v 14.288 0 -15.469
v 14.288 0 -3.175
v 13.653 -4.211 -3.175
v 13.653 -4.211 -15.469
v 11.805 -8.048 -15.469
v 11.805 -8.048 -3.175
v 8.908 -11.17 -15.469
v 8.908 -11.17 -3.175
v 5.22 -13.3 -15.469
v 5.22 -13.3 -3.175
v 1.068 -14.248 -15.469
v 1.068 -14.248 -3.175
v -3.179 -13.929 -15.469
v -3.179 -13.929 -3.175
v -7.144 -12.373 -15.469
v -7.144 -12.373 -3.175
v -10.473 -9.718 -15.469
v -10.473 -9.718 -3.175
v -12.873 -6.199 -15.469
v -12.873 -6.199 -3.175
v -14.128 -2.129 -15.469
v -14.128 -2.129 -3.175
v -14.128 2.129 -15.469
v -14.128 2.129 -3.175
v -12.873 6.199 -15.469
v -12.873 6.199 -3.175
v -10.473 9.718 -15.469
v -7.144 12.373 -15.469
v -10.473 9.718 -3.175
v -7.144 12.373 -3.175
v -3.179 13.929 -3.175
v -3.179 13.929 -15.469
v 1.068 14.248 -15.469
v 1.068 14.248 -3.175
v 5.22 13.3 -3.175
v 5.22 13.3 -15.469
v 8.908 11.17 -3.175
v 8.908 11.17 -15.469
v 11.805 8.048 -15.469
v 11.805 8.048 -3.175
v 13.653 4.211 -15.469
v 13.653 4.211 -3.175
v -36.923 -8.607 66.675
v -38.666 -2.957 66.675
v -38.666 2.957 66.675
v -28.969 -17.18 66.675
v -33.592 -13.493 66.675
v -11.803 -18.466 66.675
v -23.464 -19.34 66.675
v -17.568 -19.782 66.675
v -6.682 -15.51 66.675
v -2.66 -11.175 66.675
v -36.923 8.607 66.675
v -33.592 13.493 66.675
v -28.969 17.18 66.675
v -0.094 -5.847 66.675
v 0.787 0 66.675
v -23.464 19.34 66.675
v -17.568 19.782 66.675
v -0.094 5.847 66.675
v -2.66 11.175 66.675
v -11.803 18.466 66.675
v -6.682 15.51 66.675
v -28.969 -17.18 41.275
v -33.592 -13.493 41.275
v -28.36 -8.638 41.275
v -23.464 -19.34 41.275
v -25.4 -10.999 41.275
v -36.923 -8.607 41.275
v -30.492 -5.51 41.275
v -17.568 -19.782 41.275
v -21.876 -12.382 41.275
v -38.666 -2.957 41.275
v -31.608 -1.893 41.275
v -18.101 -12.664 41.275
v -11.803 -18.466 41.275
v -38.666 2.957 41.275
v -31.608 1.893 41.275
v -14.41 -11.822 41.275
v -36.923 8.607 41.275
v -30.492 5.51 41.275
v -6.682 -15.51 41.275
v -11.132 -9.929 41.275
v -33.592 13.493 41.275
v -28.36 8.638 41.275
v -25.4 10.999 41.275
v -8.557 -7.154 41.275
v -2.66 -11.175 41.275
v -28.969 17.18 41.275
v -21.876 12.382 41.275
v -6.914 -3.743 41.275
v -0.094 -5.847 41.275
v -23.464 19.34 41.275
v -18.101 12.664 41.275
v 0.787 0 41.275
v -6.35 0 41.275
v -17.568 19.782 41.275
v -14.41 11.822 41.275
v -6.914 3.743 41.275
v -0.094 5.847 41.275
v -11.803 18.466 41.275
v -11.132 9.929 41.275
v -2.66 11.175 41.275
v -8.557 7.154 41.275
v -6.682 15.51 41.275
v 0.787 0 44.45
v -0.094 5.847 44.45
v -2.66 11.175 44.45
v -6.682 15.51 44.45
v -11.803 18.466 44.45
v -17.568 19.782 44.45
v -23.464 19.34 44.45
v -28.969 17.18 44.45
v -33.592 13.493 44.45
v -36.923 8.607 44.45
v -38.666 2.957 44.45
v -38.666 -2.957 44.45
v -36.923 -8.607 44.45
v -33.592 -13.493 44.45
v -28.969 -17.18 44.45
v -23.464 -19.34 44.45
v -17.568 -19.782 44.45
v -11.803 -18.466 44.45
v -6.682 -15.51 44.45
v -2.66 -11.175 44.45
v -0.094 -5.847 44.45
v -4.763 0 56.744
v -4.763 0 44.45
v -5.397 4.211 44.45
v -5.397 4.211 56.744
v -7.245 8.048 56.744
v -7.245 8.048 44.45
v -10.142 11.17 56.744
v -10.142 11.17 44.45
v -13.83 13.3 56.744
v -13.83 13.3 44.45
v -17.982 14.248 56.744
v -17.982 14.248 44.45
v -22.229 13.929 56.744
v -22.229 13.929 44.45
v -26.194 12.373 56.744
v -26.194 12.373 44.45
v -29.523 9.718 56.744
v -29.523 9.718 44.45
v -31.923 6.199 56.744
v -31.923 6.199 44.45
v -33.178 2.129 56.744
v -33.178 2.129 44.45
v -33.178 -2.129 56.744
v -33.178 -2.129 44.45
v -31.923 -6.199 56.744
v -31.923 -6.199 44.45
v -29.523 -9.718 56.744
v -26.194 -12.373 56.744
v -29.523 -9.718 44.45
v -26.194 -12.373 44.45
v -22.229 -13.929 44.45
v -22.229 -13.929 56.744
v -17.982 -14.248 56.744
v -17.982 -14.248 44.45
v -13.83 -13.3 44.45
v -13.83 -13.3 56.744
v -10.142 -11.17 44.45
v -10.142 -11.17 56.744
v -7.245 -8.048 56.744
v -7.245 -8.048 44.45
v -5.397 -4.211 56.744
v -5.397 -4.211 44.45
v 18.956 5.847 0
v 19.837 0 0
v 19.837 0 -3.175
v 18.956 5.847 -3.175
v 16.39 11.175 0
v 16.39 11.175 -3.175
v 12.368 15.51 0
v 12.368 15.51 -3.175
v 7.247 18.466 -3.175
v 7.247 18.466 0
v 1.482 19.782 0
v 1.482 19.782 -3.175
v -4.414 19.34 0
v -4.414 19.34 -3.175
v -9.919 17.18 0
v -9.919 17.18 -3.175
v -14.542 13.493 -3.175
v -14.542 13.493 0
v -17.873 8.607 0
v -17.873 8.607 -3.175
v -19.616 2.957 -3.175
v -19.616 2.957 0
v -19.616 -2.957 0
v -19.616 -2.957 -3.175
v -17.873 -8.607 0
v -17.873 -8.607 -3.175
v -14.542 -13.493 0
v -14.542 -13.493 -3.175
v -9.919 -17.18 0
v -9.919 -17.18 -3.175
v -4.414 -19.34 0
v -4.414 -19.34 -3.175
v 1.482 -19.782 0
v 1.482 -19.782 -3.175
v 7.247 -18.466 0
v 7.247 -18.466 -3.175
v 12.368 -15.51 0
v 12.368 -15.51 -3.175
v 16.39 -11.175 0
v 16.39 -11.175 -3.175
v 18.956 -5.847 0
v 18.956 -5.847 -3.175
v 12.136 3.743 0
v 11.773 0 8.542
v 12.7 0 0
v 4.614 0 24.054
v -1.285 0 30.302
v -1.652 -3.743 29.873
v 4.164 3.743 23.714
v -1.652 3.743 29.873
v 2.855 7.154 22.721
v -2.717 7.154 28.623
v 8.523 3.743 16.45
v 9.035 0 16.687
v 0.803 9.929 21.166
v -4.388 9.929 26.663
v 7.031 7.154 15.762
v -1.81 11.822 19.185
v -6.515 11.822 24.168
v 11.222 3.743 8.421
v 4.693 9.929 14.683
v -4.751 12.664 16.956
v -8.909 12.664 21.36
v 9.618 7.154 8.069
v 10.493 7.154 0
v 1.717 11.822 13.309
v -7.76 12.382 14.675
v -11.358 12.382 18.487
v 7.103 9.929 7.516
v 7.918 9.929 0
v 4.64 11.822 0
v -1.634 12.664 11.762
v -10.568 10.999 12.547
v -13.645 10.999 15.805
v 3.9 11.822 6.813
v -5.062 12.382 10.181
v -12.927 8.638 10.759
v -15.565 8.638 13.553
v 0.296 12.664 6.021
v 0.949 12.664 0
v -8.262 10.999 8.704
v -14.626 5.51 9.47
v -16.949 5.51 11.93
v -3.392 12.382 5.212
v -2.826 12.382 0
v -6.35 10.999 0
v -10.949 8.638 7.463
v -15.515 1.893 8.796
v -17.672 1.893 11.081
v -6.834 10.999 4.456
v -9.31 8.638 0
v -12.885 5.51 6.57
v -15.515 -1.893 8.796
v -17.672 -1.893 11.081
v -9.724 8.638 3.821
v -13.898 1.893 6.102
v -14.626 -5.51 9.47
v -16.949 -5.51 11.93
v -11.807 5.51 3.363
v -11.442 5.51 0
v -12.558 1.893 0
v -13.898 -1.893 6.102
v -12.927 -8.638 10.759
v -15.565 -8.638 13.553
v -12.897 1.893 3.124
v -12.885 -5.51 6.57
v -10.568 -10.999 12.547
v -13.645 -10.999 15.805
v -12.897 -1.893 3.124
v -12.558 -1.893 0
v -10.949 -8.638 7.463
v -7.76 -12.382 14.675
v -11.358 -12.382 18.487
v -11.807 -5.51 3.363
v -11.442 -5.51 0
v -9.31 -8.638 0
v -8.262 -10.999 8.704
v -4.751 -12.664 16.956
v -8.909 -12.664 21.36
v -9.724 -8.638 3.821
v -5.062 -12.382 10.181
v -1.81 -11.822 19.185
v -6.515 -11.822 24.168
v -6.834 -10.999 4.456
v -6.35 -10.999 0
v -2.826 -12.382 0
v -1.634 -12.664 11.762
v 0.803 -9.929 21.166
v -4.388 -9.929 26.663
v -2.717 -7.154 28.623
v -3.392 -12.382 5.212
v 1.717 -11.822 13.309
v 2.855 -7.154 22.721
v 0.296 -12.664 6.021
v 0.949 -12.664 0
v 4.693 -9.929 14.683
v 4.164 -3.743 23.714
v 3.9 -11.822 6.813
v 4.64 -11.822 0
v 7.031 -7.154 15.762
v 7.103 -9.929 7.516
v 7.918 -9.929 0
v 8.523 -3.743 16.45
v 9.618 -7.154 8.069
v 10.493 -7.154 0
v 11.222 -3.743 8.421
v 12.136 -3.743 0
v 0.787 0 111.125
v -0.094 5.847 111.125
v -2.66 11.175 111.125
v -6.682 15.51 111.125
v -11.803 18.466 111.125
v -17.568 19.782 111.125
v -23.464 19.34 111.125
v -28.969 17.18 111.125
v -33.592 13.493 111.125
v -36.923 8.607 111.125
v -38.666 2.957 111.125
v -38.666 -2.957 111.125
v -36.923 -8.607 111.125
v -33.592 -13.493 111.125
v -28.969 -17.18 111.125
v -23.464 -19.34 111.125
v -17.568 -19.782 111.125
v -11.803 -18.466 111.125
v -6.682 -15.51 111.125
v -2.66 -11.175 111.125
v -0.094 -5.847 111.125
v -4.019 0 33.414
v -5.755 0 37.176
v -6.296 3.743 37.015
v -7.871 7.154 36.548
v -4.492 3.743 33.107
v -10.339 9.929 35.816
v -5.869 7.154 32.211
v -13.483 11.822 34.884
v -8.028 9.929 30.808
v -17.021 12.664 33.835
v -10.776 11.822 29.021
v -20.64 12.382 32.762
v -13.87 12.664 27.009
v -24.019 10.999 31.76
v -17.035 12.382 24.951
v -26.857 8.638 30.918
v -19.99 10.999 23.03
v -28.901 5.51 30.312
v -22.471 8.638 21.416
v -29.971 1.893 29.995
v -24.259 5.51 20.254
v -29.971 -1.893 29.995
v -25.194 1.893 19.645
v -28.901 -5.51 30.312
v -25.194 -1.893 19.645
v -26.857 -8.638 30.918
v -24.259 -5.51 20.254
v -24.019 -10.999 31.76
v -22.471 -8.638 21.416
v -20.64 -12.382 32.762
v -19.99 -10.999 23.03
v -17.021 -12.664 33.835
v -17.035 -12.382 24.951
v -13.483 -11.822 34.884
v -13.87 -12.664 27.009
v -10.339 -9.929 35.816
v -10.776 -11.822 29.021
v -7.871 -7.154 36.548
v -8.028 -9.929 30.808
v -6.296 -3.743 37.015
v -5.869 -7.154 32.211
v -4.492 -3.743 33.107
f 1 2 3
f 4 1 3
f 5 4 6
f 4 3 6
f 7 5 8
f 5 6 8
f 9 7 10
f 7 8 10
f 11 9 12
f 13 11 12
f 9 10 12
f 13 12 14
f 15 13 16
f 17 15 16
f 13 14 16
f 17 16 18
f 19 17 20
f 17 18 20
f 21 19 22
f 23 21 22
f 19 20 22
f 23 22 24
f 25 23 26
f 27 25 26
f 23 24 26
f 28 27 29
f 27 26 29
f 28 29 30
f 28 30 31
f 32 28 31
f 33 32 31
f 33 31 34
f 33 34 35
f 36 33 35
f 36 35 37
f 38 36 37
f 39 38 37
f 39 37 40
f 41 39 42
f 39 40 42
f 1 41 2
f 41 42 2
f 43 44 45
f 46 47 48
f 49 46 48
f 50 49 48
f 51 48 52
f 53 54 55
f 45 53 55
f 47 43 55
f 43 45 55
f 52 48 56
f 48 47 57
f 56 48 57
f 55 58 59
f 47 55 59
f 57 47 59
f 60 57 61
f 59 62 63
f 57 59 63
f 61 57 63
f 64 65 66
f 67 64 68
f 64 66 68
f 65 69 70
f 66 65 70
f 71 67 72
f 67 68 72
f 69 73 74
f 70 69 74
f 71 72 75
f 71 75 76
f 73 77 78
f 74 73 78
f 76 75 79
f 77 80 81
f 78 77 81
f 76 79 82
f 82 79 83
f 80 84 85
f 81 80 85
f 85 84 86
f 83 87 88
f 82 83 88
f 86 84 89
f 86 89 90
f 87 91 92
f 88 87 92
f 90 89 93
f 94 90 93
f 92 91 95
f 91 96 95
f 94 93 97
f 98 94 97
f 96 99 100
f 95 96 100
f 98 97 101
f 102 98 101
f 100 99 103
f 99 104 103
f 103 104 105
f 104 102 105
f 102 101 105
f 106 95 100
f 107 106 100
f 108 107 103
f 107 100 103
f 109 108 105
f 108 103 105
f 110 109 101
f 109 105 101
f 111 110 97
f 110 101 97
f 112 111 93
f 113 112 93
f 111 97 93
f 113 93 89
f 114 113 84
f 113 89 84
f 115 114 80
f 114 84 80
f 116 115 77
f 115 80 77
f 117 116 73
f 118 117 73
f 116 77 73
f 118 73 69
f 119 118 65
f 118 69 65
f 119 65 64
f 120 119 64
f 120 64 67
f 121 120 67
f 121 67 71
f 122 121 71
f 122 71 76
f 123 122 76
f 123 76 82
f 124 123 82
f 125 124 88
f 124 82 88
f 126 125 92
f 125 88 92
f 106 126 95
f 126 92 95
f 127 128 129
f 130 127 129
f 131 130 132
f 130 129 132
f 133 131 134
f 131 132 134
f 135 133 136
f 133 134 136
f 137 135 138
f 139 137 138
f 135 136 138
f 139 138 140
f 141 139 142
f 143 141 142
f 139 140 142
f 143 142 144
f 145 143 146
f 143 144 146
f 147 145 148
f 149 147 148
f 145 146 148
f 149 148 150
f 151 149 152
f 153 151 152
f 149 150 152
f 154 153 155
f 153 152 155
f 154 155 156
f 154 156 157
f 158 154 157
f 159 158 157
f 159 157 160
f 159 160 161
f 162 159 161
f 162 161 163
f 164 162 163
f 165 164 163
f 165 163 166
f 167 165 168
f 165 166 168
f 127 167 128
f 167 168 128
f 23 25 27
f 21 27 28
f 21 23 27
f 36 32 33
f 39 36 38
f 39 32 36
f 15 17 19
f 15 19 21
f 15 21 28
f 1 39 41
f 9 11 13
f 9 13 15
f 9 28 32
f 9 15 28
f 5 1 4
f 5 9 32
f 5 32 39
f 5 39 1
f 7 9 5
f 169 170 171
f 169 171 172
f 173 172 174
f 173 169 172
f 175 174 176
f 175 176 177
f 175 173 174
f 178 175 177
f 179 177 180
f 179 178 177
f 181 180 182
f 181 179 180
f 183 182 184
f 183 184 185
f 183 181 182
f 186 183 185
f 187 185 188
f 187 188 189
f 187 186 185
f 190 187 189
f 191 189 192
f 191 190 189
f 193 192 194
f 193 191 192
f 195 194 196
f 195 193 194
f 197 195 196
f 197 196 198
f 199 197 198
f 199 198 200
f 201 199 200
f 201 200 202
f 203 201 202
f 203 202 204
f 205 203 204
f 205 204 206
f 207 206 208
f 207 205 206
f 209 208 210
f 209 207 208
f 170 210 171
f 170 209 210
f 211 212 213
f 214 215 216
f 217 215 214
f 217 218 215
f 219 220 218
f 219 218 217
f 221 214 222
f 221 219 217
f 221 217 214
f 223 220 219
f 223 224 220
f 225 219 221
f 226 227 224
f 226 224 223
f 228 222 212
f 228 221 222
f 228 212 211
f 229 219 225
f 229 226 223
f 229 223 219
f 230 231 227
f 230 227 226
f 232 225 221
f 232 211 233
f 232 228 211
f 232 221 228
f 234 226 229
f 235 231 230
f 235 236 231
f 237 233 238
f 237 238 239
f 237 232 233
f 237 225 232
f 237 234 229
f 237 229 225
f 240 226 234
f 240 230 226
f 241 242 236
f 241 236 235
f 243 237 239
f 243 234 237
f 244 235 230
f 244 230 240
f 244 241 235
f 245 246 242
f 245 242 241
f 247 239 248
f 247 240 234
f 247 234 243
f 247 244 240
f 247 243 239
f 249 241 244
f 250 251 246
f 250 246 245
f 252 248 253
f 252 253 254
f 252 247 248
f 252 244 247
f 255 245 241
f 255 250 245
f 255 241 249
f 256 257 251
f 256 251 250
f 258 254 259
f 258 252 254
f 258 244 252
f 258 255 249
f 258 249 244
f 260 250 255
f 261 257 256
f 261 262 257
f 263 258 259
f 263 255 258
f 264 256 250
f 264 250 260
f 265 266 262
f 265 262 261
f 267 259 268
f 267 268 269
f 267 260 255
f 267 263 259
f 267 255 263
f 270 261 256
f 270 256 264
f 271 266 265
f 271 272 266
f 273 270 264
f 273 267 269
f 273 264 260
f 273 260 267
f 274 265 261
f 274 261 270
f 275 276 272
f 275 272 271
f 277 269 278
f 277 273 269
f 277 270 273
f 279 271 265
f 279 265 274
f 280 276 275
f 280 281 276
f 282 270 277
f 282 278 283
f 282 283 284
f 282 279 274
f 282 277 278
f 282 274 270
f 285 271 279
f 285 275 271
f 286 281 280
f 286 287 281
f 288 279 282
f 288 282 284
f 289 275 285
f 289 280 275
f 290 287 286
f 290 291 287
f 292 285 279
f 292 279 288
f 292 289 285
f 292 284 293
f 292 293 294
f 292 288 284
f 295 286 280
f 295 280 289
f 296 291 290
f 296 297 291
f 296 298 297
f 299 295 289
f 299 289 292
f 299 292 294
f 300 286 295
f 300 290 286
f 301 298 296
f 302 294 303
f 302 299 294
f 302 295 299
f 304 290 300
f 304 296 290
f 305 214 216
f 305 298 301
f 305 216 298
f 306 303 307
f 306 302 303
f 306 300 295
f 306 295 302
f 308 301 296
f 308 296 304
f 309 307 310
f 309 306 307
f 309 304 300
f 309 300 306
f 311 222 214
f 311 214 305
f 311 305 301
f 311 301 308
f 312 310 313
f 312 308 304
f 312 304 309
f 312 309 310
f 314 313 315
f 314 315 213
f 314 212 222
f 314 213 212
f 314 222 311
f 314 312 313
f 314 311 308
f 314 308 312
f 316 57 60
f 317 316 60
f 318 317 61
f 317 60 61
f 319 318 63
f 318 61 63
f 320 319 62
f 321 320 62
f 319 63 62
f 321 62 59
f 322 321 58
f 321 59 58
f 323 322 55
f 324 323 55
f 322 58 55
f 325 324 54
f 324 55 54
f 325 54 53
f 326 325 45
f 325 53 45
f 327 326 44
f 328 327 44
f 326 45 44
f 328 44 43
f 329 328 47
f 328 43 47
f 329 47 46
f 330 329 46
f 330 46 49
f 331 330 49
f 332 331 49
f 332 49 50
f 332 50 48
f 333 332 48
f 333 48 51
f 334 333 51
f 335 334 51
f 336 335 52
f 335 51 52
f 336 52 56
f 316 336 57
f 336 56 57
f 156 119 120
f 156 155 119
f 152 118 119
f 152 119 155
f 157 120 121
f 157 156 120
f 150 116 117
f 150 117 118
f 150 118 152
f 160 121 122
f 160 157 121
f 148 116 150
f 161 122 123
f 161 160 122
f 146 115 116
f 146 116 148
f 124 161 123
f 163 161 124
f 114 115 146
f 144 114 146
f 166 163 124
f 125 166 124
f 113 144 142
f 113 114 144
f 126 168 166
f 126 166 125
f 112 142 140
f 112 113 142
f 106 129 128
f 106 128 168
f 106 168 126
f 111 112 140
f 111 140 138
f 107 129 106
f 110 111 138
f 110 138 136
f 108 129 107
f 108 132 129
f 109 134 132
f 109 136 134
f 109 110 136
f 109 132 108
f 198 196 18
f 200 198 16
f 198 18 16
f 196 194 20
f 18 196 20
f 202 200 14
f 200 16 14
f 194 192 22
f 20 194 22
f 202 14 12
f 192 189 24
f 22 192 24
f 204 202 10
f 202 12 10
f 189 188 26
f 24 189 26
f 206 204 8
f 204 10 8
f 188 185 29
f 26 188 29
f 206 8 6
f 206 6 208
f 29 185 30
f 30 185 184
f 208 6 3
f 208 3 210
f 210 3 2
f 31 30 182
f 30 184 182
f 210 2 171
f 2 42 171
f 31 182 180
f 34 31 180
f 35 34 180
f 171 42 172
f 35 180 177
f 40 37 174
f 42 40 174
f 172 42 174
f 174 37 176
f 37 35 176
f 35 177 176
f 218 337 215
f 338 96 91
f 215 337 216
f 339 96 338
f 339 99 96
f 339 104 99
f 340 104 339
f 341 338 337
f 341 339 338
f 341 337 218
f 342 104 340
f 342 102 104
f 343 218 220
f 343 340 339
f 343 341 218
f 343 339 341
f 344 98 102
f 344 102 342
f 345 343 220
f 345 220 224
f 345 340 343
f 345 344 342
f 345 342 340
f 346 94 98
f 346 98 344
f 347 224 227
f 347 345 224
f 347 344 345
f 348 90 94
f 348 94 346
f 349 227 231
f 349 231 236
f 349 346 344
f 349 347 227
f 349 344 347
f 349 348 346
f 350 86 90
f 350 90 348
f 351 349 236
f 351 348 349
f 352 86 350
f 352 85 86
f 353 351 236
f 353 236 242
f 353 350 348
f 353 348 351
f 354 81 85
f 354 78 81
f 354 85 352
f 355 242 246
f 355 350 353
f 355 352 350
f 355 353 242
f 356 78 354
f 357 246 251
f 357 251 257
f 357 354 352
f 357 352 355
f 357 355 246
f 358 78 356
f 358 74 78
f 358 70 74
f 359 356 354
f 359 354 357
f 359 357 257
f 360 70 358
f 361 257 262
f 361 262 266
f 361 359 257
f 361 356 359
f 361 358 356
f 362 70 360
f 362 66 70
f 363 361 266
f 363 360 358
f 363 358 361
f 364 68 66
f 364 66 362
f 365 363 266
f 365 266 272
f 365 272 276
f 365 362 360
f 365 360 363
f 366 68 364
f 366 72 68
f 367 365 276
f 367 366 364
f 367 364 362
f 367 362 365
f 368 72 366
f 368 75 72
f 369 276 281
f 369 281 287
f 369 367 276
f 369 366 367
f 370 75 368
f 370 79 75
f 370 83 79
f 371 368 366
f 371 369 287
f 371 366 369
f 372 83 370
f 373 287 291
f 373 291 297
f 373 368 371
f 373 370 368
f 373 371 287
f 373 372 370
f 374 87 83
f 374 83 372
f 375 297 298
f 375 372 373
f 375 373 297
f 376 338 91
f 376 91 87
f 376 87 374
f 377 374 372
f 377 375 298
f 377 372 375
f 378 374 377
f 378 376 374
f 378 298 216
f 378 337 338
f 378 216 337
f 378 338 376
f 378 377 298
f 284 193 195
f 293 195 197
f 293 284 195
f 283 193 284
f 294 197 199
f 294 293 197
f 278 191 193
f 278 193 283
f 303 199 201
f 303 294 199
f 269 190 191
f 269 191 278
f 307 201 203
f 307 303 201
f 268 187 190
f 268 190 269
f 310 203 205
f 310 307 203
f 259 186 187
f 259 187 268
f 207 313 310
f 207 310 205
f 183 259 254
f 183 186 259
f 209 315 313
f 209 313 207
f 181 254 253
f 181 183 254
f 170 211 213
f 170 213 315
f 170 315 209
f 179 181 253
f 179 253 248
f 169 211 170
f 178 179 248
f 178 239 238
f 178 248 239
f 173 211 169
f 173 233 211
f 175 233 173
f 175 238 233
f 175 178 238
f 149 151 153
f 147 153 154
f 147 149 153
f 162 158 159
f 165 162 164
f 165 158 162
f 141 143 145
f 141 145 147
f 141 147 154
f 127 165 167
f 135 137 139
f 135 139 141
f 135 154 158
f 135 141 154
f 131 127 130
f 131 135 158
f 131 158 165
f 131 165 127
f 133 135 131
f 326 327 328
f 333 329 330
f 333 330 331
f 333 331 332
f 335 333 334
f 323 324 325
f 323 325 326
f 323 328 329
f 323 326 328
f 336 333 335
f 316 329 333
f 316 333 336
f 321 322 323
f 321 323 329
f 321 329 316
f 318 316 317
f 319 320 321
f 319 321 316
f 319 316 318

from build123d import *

# Parameters (mm, degrees)
F2_R      = 12.7
F2_R_2    = 19.8374
F5_DEPTH  = 3.175
F0_R      = 19.8374
F0_R_2    = 12.7
F6_DEPTH  = 3.175
F7_R      = 14.2875
F8_DEPTH  = 12.2936
F9_R      = 14.2875
F10_DEPTH = 12.2936
F12_R     = 19.8374
F13_DEPTH = 44.45


with BuildPart() as f4:
    # F4: sweep along a path in F3
    with BuildLine(Plane.XZ) as f4_path:
        ThreePointArc((-19.05, 41.275), (-16.5538776828, 29.910229531), (-9.525, 20.6375))
        ThreePointArc((-9.525, 20.6375), (-2.4961223172, 11.364770469), (0, 0))
    # F2 (on offset) → F4 (sweep)
    with BuildSketch(Plane.XY.offset(41.275)):
        with Locations((-19.05, 0)):
            Circle(F2_R)
    sweep(path=f4_path.line)

    # F2 (on offset) → F5 (join)
    with BuildSketch(Plane.XY.offset(41.275)):
        with Locations((-19.05, 0)):
            Circle(F2_R_2)
        with Locations((-19.05, 0)):
            Circle(F2_R, mode=Mode.SUBTRACT)
        with Locations((-19.05, 0)):
            Circle(F2_R)
    extrude(amount=F5_DEPTH)

    # F0 (on Top) → F6 (join)
    with BuildSketch(Plane.XY):
        Circle(F0_R)
        Circle(F0_R_2, mode=Mode.SUBTRACT)
        Circle(F0_R_2)
    extrude(amount=-F6_DEPTH)

    # F7 (on face) → F8 (join)
    with BuildSketch(Plane.XY.offset(44.45)):
        with Locations((-19.05, 0)):
            Circle(F7_R)
    extrude(amount=F8_DEPTH)

    # F9 (on face) → F10 (join)
    with BuildSketch(Plane(origin=(0, 0, -3.175), x_dir=(1, 0, 0), z_dir=(0, 0, -1))):
        Circle(F9_R)
    extrude(amount=F10_DEPTH)


with BuildPart() as f13:
    # F12 (on offset) → F13 (new body)
    with BuildSketch(Plane.XY.offset(66.675)):
        with Locations((-19.05, 0)):
            Circle(F12_R)
    extrude(amount=F13_DEPTH)


solid = Compound([f4.part, f13.part])
